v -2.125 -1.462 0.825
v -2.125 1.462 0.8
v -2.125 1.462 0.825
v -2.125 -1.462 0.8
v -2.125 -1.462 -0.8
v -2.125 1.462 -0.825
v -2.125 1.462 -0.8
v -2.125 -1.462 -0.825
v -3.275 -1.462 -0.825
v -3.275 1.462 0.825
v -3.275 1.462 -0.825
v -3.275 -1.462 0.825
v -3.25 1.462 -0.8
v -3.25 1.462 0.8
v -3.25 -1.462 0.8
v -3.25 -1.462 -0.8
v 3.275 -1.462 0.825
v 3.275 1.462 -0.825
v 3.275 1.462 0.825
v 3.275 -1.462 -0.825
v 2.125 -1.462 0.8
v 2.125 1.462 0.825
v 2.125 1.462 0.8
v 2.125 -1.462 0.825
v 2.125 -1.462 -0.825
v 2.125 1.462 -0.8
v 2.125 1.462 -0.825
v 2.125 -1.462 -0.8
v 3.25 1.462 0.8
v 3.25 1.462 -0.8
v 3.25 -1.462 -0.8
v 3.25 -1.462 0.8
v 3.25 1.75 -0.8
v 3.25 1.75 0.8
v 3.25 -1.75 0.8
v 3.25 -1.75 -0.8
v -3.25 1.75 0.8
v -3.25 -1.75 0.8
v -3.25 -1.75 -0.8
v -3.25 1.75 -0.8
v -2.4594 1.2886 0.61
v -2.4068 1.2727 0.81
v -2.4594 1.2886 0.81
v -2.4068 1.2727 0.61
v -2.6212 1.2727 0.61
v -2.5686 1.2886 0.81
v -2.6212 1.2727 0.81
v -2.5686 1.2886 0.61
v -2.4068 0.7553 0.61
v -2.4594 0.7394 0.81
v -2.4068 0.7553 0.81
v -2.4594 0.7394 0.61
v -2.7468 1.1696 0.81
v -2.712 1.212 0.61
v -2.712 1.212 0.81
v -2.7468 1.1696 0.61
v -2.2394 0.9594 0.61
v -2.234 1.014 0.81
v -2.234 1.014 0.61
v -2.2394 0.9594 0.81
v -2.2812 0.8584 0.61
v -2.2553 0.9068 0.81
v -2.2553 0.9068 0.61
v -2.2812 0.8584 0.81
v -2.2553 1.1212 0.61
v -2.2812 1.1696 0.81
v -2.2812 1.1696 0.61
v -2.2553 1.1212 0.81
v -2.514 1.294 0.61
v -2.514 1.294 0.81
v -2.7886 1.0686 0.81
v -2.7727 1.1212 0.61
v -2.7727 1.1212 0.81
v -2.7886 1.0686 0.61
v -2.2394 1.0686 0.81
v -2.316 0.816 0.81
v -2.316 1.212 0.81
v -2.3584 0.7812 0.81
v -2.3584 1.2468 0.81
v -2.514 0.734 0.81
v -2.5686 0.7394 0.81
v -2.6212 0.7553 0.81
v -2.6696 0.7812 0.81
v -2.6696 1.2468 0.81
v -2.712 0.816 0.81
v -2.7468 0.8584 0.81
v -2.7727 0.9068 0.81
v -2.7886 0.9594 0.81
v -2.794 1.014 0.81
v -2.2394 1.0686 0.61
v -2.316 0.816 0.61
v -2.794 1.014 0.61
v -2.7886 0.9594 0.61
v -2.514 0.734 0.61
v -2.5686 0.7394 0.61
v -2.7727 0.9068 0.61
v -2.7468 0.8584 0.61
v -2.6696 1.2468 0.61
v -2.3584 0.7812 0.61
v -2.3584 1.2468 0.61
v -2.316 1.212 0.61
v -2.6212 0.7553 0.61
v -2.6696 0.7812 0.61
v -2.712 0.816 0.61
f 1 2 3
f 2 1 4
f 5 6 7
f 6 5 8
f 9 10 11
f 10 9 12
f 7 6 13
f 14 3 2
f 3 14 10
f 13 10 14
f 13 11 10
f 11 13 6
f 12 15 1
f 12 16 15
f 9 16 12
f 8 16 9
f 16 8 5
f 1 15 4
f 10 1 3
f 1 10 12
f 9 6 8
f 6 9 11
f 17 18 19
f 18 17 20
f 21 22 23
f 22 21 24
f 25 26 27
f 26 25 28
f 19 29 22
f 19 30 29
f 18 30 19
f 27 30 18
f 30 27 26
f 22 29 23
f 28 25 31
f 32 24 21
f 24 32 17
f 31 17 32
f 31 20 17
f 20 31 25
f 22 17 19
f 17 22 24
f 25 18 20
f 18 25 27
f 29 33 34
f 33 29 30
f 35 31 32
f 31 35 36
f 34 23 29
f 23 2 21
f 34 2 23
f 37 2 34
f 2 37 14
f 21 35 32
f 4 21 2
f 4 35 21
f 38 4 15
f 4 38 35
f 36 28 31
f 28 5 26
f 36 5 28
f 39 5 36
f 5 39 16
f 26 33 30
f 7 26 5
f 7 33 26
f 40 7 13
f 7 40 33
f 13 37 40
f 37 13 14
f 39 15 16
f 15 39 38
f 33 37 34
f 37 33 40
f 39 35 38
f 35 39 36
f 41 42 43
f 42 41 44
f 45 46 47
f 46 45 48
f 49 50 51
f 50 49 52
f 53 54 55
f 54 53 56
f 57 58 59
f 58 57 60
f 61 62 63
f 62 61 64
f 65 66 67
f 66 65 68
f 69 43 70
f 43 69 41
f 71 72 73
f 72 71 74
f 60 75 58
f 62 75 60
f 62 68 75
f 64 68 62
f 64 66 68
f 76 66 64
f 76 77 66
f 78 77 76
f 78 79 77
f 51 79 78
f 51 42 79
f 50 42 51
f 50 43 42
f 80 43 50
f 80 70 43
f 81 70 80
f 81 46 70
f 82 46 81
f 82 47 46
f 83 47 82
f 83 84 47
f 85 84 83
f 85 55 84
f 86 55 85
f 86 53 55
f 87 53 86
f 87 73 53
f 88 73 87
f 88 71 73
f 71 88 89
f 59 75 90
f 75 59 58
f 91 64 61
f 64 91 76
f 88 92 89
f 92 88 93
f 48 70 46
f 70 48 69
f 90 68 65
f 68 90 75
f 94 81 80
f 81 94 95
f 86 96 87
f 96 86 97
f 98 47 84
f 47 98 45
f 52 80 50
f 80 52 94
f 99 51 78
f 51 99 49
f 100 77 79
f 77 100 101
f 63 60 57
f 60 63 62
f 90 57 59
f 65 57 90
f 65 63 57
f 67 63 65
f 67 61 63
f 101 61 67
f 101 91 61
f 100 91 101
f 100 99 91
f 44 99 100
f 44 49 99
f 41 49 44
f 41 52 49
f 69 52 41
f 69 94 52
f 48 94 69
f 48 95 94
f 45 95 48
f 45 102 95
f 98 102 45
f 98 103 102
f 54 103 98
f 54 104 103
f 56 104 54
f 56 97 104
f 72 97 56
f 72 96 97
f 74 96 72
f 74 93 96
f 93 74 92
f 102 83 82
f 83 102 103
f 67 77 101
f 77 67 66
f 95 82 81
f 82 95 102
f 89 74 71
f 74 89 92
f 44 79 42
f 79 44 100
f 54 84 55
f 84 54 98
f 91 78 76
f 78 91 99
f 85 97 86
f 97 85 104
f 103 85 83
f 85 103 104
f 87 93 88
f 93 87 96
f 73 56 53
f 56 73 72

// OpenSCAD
// SMD package: overall [6.5, 3.5, 1.6] mm
// One connected solid: body + end terminations fused to body.
// Includes shallow top polarity mark and visible end pads on top/bottom.

body_length = 6.5; //[3.25:13:0.1]
body_width  = 3.5; //[1.75:7:0.1]
body_height = 1.6; //[0.8:3.2:0.05]

$fn = 32;

eps = 0.02;
overlap = 0.05; // ensures fused solids (no floating / no coincident faces)

// Feature sizing (kept proportional; does not change overall dimensions)
term_len = min(1.1, body_length*0.18);          // end termination length
term_thk = min(0.30, body_height*0.22);         // termination thickness on top/bottom
side_wrap = min(0.18, body_width*0.06);         // small side wrap to make pads visible in side views
chamfer  = min(0.35, min(body_width, body_height)*0.18);
mark_r   = min(0.35, min(body_width, body_length)*0.08);
mark_d   = min(0.18, body_height*0.12);         // engraving depth

module smd_connected_solid() {

    // Main connected solid (no colors; single printable solid)
    difference() {
        union() {
            // Body
            cube([body_length, body_width, body_height], center=true);

            // End terminations: top + bottom + small side wrap, fused into body with overlap
            for (sx = [-1, 1]) {
                x_term = sx*(body_length/2 - term_len/2);

                // Top pad
                translate([x_term, 0, body_height/2 - term_thk/2 - overlap/2])
                    cube([term_len + overlap, body_width - 2*chamfer, term_thk + overlap], center=true);

                // Bottom pad
                translate([x_term, 0, -body_height/2 + term_thk/2 + overlap/2])
                    cube([term_len + overlap, body_width - 2*chamfer, term_thk + overlap], center=true);

                // Side wrap (makes terminations visible in left/right views)
                translate([x_term, 0, 0])
                    cube([term_len + overlap, body_width - 2*chamfer, body_height + overlap], center=true);

                // Slightly inset "window" to keep wrap narrow (still connected)
                // This creates a band near the ends rather than full-height metal look.
                // Implemented by adding a thin band only (already done by term_len), no extra subtraction needed.
            }
        }

        // Engraved polarity mark on top surface (shallow)
        translate([
            -body_length/2 + chamfer + mark_r*1.6,
             body_width/2  - chamfer - mark_r*1.6,
             body_height/2 - mark_d/2
        ])
            cylinder(h=mark_d + eps, r=mark_r, center=true);
    }
}

smd_connected_solid();
